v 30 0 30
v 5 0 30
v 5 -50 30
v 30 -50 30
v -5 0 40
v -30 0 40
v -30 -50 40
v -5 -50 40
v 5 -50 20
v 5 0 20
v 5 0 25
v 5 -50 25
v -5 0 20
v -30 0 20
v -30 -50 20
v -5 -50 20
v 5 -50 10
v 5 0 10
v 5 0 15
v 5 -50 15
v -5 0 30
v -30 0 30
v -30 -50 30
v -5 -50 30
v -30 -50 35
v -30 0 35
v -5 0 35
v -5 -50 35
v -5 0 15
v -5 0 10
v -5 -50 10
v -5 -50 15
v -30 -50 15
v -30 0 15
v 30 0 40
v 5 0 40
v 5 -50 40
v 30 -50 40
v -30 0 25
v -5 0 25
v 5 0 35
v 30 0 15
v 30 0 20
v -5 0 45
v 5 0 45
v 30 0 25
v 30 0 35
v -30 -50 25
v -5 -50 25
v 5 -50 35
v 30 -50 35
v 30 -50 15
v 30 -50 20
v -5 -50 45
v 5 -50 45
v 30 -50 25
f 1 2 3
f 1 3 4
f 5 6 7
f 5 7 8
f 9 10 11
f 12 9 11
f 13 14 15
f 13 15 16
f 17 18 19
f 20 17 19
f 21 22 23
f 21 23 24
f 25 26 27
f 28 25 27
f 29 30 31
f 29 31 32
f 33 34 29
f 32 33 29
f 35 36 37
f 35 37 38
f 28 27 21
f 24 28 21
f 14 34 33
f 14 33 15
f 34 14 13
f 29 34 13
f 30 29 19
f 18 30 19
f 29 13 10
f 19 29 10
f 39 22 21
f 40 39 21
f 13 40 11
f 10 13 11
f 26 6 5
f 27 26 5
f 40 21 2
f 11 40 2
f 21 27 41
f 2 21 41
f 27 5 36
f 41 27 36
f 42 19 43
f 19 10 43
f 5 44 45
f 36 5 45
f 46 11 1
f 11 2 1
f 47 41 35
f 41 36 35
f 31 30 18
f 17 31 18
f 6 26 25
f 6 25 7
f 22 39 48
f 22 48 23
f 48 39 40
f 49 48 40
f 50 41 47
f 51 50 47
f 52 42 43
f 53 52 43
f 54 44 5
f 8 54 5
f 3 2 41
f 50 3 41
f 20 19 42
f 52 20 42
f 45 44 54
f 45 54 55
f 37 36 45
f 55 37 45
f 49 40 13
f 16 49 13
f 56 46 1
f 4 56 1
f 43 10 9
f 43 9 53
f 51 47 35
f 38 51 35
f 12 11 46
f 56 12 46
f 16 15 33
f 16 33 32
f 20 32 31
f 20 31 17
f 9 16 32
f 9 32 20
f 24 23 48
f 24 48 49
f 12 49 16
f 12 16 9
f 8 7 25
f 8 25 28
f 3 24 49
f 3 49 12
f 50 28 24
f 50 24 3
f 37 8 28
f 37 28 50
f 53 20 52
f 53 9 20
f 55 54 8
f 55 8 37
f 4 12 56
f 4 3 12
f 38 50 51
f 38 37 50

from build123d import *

# Parameters (mm, degrees)
F0_W     = 10
F0_H     = 5
F0_W_2   = 25
F1_DEPTH = 50


with BuildPart() as f1:
    # F0 (on Front) → F1 (new body)
    with BuildSketch(Plane.XZ):
        with Locations((0, 42.5)):
            Rectangle(F0_W, F0_H)
        with Locations((0, 37.5)):
            Rectangle(F0_W, F0_H)
        with Locations((-17.5, 37.5)):
            Rectangle(F0_W_2, F0_H)
        with Locations((17.5, 37.5)):
            Rectangle(F0_W_2, F0_H)
        with Locations((0, 32.5)):
            Rectangle(F0_W, F0_H)
        with Locations((0, 27.5)):
            Rectangle(F0_W, F0_H)
        with Locations((-17.5, 27.5)):
            Rectangle(F0_W_2, F0_H)
        with Locations((17.5, 27.5)):
            Rectangle(F0_W_2, F0_H)
        with Locations((0, 22.5)):
            Rectangle(F0_W, F0_H)
        with Locations((0, 17.5)):
            Rectangle(F0_W, F0_H)
        with Locations((-17.5, 17.5)):
            Rectangle(F0_W_2, F0_H)
        with Locations((17.5, 17.5)):
            Rectangle(F0_W_2, F0_H)
        with Locations((0, 12.5)):
            Rectangle(F0_W, F0_H)
    extrude(amount=F1_DEPTH)


solid = f1.part
